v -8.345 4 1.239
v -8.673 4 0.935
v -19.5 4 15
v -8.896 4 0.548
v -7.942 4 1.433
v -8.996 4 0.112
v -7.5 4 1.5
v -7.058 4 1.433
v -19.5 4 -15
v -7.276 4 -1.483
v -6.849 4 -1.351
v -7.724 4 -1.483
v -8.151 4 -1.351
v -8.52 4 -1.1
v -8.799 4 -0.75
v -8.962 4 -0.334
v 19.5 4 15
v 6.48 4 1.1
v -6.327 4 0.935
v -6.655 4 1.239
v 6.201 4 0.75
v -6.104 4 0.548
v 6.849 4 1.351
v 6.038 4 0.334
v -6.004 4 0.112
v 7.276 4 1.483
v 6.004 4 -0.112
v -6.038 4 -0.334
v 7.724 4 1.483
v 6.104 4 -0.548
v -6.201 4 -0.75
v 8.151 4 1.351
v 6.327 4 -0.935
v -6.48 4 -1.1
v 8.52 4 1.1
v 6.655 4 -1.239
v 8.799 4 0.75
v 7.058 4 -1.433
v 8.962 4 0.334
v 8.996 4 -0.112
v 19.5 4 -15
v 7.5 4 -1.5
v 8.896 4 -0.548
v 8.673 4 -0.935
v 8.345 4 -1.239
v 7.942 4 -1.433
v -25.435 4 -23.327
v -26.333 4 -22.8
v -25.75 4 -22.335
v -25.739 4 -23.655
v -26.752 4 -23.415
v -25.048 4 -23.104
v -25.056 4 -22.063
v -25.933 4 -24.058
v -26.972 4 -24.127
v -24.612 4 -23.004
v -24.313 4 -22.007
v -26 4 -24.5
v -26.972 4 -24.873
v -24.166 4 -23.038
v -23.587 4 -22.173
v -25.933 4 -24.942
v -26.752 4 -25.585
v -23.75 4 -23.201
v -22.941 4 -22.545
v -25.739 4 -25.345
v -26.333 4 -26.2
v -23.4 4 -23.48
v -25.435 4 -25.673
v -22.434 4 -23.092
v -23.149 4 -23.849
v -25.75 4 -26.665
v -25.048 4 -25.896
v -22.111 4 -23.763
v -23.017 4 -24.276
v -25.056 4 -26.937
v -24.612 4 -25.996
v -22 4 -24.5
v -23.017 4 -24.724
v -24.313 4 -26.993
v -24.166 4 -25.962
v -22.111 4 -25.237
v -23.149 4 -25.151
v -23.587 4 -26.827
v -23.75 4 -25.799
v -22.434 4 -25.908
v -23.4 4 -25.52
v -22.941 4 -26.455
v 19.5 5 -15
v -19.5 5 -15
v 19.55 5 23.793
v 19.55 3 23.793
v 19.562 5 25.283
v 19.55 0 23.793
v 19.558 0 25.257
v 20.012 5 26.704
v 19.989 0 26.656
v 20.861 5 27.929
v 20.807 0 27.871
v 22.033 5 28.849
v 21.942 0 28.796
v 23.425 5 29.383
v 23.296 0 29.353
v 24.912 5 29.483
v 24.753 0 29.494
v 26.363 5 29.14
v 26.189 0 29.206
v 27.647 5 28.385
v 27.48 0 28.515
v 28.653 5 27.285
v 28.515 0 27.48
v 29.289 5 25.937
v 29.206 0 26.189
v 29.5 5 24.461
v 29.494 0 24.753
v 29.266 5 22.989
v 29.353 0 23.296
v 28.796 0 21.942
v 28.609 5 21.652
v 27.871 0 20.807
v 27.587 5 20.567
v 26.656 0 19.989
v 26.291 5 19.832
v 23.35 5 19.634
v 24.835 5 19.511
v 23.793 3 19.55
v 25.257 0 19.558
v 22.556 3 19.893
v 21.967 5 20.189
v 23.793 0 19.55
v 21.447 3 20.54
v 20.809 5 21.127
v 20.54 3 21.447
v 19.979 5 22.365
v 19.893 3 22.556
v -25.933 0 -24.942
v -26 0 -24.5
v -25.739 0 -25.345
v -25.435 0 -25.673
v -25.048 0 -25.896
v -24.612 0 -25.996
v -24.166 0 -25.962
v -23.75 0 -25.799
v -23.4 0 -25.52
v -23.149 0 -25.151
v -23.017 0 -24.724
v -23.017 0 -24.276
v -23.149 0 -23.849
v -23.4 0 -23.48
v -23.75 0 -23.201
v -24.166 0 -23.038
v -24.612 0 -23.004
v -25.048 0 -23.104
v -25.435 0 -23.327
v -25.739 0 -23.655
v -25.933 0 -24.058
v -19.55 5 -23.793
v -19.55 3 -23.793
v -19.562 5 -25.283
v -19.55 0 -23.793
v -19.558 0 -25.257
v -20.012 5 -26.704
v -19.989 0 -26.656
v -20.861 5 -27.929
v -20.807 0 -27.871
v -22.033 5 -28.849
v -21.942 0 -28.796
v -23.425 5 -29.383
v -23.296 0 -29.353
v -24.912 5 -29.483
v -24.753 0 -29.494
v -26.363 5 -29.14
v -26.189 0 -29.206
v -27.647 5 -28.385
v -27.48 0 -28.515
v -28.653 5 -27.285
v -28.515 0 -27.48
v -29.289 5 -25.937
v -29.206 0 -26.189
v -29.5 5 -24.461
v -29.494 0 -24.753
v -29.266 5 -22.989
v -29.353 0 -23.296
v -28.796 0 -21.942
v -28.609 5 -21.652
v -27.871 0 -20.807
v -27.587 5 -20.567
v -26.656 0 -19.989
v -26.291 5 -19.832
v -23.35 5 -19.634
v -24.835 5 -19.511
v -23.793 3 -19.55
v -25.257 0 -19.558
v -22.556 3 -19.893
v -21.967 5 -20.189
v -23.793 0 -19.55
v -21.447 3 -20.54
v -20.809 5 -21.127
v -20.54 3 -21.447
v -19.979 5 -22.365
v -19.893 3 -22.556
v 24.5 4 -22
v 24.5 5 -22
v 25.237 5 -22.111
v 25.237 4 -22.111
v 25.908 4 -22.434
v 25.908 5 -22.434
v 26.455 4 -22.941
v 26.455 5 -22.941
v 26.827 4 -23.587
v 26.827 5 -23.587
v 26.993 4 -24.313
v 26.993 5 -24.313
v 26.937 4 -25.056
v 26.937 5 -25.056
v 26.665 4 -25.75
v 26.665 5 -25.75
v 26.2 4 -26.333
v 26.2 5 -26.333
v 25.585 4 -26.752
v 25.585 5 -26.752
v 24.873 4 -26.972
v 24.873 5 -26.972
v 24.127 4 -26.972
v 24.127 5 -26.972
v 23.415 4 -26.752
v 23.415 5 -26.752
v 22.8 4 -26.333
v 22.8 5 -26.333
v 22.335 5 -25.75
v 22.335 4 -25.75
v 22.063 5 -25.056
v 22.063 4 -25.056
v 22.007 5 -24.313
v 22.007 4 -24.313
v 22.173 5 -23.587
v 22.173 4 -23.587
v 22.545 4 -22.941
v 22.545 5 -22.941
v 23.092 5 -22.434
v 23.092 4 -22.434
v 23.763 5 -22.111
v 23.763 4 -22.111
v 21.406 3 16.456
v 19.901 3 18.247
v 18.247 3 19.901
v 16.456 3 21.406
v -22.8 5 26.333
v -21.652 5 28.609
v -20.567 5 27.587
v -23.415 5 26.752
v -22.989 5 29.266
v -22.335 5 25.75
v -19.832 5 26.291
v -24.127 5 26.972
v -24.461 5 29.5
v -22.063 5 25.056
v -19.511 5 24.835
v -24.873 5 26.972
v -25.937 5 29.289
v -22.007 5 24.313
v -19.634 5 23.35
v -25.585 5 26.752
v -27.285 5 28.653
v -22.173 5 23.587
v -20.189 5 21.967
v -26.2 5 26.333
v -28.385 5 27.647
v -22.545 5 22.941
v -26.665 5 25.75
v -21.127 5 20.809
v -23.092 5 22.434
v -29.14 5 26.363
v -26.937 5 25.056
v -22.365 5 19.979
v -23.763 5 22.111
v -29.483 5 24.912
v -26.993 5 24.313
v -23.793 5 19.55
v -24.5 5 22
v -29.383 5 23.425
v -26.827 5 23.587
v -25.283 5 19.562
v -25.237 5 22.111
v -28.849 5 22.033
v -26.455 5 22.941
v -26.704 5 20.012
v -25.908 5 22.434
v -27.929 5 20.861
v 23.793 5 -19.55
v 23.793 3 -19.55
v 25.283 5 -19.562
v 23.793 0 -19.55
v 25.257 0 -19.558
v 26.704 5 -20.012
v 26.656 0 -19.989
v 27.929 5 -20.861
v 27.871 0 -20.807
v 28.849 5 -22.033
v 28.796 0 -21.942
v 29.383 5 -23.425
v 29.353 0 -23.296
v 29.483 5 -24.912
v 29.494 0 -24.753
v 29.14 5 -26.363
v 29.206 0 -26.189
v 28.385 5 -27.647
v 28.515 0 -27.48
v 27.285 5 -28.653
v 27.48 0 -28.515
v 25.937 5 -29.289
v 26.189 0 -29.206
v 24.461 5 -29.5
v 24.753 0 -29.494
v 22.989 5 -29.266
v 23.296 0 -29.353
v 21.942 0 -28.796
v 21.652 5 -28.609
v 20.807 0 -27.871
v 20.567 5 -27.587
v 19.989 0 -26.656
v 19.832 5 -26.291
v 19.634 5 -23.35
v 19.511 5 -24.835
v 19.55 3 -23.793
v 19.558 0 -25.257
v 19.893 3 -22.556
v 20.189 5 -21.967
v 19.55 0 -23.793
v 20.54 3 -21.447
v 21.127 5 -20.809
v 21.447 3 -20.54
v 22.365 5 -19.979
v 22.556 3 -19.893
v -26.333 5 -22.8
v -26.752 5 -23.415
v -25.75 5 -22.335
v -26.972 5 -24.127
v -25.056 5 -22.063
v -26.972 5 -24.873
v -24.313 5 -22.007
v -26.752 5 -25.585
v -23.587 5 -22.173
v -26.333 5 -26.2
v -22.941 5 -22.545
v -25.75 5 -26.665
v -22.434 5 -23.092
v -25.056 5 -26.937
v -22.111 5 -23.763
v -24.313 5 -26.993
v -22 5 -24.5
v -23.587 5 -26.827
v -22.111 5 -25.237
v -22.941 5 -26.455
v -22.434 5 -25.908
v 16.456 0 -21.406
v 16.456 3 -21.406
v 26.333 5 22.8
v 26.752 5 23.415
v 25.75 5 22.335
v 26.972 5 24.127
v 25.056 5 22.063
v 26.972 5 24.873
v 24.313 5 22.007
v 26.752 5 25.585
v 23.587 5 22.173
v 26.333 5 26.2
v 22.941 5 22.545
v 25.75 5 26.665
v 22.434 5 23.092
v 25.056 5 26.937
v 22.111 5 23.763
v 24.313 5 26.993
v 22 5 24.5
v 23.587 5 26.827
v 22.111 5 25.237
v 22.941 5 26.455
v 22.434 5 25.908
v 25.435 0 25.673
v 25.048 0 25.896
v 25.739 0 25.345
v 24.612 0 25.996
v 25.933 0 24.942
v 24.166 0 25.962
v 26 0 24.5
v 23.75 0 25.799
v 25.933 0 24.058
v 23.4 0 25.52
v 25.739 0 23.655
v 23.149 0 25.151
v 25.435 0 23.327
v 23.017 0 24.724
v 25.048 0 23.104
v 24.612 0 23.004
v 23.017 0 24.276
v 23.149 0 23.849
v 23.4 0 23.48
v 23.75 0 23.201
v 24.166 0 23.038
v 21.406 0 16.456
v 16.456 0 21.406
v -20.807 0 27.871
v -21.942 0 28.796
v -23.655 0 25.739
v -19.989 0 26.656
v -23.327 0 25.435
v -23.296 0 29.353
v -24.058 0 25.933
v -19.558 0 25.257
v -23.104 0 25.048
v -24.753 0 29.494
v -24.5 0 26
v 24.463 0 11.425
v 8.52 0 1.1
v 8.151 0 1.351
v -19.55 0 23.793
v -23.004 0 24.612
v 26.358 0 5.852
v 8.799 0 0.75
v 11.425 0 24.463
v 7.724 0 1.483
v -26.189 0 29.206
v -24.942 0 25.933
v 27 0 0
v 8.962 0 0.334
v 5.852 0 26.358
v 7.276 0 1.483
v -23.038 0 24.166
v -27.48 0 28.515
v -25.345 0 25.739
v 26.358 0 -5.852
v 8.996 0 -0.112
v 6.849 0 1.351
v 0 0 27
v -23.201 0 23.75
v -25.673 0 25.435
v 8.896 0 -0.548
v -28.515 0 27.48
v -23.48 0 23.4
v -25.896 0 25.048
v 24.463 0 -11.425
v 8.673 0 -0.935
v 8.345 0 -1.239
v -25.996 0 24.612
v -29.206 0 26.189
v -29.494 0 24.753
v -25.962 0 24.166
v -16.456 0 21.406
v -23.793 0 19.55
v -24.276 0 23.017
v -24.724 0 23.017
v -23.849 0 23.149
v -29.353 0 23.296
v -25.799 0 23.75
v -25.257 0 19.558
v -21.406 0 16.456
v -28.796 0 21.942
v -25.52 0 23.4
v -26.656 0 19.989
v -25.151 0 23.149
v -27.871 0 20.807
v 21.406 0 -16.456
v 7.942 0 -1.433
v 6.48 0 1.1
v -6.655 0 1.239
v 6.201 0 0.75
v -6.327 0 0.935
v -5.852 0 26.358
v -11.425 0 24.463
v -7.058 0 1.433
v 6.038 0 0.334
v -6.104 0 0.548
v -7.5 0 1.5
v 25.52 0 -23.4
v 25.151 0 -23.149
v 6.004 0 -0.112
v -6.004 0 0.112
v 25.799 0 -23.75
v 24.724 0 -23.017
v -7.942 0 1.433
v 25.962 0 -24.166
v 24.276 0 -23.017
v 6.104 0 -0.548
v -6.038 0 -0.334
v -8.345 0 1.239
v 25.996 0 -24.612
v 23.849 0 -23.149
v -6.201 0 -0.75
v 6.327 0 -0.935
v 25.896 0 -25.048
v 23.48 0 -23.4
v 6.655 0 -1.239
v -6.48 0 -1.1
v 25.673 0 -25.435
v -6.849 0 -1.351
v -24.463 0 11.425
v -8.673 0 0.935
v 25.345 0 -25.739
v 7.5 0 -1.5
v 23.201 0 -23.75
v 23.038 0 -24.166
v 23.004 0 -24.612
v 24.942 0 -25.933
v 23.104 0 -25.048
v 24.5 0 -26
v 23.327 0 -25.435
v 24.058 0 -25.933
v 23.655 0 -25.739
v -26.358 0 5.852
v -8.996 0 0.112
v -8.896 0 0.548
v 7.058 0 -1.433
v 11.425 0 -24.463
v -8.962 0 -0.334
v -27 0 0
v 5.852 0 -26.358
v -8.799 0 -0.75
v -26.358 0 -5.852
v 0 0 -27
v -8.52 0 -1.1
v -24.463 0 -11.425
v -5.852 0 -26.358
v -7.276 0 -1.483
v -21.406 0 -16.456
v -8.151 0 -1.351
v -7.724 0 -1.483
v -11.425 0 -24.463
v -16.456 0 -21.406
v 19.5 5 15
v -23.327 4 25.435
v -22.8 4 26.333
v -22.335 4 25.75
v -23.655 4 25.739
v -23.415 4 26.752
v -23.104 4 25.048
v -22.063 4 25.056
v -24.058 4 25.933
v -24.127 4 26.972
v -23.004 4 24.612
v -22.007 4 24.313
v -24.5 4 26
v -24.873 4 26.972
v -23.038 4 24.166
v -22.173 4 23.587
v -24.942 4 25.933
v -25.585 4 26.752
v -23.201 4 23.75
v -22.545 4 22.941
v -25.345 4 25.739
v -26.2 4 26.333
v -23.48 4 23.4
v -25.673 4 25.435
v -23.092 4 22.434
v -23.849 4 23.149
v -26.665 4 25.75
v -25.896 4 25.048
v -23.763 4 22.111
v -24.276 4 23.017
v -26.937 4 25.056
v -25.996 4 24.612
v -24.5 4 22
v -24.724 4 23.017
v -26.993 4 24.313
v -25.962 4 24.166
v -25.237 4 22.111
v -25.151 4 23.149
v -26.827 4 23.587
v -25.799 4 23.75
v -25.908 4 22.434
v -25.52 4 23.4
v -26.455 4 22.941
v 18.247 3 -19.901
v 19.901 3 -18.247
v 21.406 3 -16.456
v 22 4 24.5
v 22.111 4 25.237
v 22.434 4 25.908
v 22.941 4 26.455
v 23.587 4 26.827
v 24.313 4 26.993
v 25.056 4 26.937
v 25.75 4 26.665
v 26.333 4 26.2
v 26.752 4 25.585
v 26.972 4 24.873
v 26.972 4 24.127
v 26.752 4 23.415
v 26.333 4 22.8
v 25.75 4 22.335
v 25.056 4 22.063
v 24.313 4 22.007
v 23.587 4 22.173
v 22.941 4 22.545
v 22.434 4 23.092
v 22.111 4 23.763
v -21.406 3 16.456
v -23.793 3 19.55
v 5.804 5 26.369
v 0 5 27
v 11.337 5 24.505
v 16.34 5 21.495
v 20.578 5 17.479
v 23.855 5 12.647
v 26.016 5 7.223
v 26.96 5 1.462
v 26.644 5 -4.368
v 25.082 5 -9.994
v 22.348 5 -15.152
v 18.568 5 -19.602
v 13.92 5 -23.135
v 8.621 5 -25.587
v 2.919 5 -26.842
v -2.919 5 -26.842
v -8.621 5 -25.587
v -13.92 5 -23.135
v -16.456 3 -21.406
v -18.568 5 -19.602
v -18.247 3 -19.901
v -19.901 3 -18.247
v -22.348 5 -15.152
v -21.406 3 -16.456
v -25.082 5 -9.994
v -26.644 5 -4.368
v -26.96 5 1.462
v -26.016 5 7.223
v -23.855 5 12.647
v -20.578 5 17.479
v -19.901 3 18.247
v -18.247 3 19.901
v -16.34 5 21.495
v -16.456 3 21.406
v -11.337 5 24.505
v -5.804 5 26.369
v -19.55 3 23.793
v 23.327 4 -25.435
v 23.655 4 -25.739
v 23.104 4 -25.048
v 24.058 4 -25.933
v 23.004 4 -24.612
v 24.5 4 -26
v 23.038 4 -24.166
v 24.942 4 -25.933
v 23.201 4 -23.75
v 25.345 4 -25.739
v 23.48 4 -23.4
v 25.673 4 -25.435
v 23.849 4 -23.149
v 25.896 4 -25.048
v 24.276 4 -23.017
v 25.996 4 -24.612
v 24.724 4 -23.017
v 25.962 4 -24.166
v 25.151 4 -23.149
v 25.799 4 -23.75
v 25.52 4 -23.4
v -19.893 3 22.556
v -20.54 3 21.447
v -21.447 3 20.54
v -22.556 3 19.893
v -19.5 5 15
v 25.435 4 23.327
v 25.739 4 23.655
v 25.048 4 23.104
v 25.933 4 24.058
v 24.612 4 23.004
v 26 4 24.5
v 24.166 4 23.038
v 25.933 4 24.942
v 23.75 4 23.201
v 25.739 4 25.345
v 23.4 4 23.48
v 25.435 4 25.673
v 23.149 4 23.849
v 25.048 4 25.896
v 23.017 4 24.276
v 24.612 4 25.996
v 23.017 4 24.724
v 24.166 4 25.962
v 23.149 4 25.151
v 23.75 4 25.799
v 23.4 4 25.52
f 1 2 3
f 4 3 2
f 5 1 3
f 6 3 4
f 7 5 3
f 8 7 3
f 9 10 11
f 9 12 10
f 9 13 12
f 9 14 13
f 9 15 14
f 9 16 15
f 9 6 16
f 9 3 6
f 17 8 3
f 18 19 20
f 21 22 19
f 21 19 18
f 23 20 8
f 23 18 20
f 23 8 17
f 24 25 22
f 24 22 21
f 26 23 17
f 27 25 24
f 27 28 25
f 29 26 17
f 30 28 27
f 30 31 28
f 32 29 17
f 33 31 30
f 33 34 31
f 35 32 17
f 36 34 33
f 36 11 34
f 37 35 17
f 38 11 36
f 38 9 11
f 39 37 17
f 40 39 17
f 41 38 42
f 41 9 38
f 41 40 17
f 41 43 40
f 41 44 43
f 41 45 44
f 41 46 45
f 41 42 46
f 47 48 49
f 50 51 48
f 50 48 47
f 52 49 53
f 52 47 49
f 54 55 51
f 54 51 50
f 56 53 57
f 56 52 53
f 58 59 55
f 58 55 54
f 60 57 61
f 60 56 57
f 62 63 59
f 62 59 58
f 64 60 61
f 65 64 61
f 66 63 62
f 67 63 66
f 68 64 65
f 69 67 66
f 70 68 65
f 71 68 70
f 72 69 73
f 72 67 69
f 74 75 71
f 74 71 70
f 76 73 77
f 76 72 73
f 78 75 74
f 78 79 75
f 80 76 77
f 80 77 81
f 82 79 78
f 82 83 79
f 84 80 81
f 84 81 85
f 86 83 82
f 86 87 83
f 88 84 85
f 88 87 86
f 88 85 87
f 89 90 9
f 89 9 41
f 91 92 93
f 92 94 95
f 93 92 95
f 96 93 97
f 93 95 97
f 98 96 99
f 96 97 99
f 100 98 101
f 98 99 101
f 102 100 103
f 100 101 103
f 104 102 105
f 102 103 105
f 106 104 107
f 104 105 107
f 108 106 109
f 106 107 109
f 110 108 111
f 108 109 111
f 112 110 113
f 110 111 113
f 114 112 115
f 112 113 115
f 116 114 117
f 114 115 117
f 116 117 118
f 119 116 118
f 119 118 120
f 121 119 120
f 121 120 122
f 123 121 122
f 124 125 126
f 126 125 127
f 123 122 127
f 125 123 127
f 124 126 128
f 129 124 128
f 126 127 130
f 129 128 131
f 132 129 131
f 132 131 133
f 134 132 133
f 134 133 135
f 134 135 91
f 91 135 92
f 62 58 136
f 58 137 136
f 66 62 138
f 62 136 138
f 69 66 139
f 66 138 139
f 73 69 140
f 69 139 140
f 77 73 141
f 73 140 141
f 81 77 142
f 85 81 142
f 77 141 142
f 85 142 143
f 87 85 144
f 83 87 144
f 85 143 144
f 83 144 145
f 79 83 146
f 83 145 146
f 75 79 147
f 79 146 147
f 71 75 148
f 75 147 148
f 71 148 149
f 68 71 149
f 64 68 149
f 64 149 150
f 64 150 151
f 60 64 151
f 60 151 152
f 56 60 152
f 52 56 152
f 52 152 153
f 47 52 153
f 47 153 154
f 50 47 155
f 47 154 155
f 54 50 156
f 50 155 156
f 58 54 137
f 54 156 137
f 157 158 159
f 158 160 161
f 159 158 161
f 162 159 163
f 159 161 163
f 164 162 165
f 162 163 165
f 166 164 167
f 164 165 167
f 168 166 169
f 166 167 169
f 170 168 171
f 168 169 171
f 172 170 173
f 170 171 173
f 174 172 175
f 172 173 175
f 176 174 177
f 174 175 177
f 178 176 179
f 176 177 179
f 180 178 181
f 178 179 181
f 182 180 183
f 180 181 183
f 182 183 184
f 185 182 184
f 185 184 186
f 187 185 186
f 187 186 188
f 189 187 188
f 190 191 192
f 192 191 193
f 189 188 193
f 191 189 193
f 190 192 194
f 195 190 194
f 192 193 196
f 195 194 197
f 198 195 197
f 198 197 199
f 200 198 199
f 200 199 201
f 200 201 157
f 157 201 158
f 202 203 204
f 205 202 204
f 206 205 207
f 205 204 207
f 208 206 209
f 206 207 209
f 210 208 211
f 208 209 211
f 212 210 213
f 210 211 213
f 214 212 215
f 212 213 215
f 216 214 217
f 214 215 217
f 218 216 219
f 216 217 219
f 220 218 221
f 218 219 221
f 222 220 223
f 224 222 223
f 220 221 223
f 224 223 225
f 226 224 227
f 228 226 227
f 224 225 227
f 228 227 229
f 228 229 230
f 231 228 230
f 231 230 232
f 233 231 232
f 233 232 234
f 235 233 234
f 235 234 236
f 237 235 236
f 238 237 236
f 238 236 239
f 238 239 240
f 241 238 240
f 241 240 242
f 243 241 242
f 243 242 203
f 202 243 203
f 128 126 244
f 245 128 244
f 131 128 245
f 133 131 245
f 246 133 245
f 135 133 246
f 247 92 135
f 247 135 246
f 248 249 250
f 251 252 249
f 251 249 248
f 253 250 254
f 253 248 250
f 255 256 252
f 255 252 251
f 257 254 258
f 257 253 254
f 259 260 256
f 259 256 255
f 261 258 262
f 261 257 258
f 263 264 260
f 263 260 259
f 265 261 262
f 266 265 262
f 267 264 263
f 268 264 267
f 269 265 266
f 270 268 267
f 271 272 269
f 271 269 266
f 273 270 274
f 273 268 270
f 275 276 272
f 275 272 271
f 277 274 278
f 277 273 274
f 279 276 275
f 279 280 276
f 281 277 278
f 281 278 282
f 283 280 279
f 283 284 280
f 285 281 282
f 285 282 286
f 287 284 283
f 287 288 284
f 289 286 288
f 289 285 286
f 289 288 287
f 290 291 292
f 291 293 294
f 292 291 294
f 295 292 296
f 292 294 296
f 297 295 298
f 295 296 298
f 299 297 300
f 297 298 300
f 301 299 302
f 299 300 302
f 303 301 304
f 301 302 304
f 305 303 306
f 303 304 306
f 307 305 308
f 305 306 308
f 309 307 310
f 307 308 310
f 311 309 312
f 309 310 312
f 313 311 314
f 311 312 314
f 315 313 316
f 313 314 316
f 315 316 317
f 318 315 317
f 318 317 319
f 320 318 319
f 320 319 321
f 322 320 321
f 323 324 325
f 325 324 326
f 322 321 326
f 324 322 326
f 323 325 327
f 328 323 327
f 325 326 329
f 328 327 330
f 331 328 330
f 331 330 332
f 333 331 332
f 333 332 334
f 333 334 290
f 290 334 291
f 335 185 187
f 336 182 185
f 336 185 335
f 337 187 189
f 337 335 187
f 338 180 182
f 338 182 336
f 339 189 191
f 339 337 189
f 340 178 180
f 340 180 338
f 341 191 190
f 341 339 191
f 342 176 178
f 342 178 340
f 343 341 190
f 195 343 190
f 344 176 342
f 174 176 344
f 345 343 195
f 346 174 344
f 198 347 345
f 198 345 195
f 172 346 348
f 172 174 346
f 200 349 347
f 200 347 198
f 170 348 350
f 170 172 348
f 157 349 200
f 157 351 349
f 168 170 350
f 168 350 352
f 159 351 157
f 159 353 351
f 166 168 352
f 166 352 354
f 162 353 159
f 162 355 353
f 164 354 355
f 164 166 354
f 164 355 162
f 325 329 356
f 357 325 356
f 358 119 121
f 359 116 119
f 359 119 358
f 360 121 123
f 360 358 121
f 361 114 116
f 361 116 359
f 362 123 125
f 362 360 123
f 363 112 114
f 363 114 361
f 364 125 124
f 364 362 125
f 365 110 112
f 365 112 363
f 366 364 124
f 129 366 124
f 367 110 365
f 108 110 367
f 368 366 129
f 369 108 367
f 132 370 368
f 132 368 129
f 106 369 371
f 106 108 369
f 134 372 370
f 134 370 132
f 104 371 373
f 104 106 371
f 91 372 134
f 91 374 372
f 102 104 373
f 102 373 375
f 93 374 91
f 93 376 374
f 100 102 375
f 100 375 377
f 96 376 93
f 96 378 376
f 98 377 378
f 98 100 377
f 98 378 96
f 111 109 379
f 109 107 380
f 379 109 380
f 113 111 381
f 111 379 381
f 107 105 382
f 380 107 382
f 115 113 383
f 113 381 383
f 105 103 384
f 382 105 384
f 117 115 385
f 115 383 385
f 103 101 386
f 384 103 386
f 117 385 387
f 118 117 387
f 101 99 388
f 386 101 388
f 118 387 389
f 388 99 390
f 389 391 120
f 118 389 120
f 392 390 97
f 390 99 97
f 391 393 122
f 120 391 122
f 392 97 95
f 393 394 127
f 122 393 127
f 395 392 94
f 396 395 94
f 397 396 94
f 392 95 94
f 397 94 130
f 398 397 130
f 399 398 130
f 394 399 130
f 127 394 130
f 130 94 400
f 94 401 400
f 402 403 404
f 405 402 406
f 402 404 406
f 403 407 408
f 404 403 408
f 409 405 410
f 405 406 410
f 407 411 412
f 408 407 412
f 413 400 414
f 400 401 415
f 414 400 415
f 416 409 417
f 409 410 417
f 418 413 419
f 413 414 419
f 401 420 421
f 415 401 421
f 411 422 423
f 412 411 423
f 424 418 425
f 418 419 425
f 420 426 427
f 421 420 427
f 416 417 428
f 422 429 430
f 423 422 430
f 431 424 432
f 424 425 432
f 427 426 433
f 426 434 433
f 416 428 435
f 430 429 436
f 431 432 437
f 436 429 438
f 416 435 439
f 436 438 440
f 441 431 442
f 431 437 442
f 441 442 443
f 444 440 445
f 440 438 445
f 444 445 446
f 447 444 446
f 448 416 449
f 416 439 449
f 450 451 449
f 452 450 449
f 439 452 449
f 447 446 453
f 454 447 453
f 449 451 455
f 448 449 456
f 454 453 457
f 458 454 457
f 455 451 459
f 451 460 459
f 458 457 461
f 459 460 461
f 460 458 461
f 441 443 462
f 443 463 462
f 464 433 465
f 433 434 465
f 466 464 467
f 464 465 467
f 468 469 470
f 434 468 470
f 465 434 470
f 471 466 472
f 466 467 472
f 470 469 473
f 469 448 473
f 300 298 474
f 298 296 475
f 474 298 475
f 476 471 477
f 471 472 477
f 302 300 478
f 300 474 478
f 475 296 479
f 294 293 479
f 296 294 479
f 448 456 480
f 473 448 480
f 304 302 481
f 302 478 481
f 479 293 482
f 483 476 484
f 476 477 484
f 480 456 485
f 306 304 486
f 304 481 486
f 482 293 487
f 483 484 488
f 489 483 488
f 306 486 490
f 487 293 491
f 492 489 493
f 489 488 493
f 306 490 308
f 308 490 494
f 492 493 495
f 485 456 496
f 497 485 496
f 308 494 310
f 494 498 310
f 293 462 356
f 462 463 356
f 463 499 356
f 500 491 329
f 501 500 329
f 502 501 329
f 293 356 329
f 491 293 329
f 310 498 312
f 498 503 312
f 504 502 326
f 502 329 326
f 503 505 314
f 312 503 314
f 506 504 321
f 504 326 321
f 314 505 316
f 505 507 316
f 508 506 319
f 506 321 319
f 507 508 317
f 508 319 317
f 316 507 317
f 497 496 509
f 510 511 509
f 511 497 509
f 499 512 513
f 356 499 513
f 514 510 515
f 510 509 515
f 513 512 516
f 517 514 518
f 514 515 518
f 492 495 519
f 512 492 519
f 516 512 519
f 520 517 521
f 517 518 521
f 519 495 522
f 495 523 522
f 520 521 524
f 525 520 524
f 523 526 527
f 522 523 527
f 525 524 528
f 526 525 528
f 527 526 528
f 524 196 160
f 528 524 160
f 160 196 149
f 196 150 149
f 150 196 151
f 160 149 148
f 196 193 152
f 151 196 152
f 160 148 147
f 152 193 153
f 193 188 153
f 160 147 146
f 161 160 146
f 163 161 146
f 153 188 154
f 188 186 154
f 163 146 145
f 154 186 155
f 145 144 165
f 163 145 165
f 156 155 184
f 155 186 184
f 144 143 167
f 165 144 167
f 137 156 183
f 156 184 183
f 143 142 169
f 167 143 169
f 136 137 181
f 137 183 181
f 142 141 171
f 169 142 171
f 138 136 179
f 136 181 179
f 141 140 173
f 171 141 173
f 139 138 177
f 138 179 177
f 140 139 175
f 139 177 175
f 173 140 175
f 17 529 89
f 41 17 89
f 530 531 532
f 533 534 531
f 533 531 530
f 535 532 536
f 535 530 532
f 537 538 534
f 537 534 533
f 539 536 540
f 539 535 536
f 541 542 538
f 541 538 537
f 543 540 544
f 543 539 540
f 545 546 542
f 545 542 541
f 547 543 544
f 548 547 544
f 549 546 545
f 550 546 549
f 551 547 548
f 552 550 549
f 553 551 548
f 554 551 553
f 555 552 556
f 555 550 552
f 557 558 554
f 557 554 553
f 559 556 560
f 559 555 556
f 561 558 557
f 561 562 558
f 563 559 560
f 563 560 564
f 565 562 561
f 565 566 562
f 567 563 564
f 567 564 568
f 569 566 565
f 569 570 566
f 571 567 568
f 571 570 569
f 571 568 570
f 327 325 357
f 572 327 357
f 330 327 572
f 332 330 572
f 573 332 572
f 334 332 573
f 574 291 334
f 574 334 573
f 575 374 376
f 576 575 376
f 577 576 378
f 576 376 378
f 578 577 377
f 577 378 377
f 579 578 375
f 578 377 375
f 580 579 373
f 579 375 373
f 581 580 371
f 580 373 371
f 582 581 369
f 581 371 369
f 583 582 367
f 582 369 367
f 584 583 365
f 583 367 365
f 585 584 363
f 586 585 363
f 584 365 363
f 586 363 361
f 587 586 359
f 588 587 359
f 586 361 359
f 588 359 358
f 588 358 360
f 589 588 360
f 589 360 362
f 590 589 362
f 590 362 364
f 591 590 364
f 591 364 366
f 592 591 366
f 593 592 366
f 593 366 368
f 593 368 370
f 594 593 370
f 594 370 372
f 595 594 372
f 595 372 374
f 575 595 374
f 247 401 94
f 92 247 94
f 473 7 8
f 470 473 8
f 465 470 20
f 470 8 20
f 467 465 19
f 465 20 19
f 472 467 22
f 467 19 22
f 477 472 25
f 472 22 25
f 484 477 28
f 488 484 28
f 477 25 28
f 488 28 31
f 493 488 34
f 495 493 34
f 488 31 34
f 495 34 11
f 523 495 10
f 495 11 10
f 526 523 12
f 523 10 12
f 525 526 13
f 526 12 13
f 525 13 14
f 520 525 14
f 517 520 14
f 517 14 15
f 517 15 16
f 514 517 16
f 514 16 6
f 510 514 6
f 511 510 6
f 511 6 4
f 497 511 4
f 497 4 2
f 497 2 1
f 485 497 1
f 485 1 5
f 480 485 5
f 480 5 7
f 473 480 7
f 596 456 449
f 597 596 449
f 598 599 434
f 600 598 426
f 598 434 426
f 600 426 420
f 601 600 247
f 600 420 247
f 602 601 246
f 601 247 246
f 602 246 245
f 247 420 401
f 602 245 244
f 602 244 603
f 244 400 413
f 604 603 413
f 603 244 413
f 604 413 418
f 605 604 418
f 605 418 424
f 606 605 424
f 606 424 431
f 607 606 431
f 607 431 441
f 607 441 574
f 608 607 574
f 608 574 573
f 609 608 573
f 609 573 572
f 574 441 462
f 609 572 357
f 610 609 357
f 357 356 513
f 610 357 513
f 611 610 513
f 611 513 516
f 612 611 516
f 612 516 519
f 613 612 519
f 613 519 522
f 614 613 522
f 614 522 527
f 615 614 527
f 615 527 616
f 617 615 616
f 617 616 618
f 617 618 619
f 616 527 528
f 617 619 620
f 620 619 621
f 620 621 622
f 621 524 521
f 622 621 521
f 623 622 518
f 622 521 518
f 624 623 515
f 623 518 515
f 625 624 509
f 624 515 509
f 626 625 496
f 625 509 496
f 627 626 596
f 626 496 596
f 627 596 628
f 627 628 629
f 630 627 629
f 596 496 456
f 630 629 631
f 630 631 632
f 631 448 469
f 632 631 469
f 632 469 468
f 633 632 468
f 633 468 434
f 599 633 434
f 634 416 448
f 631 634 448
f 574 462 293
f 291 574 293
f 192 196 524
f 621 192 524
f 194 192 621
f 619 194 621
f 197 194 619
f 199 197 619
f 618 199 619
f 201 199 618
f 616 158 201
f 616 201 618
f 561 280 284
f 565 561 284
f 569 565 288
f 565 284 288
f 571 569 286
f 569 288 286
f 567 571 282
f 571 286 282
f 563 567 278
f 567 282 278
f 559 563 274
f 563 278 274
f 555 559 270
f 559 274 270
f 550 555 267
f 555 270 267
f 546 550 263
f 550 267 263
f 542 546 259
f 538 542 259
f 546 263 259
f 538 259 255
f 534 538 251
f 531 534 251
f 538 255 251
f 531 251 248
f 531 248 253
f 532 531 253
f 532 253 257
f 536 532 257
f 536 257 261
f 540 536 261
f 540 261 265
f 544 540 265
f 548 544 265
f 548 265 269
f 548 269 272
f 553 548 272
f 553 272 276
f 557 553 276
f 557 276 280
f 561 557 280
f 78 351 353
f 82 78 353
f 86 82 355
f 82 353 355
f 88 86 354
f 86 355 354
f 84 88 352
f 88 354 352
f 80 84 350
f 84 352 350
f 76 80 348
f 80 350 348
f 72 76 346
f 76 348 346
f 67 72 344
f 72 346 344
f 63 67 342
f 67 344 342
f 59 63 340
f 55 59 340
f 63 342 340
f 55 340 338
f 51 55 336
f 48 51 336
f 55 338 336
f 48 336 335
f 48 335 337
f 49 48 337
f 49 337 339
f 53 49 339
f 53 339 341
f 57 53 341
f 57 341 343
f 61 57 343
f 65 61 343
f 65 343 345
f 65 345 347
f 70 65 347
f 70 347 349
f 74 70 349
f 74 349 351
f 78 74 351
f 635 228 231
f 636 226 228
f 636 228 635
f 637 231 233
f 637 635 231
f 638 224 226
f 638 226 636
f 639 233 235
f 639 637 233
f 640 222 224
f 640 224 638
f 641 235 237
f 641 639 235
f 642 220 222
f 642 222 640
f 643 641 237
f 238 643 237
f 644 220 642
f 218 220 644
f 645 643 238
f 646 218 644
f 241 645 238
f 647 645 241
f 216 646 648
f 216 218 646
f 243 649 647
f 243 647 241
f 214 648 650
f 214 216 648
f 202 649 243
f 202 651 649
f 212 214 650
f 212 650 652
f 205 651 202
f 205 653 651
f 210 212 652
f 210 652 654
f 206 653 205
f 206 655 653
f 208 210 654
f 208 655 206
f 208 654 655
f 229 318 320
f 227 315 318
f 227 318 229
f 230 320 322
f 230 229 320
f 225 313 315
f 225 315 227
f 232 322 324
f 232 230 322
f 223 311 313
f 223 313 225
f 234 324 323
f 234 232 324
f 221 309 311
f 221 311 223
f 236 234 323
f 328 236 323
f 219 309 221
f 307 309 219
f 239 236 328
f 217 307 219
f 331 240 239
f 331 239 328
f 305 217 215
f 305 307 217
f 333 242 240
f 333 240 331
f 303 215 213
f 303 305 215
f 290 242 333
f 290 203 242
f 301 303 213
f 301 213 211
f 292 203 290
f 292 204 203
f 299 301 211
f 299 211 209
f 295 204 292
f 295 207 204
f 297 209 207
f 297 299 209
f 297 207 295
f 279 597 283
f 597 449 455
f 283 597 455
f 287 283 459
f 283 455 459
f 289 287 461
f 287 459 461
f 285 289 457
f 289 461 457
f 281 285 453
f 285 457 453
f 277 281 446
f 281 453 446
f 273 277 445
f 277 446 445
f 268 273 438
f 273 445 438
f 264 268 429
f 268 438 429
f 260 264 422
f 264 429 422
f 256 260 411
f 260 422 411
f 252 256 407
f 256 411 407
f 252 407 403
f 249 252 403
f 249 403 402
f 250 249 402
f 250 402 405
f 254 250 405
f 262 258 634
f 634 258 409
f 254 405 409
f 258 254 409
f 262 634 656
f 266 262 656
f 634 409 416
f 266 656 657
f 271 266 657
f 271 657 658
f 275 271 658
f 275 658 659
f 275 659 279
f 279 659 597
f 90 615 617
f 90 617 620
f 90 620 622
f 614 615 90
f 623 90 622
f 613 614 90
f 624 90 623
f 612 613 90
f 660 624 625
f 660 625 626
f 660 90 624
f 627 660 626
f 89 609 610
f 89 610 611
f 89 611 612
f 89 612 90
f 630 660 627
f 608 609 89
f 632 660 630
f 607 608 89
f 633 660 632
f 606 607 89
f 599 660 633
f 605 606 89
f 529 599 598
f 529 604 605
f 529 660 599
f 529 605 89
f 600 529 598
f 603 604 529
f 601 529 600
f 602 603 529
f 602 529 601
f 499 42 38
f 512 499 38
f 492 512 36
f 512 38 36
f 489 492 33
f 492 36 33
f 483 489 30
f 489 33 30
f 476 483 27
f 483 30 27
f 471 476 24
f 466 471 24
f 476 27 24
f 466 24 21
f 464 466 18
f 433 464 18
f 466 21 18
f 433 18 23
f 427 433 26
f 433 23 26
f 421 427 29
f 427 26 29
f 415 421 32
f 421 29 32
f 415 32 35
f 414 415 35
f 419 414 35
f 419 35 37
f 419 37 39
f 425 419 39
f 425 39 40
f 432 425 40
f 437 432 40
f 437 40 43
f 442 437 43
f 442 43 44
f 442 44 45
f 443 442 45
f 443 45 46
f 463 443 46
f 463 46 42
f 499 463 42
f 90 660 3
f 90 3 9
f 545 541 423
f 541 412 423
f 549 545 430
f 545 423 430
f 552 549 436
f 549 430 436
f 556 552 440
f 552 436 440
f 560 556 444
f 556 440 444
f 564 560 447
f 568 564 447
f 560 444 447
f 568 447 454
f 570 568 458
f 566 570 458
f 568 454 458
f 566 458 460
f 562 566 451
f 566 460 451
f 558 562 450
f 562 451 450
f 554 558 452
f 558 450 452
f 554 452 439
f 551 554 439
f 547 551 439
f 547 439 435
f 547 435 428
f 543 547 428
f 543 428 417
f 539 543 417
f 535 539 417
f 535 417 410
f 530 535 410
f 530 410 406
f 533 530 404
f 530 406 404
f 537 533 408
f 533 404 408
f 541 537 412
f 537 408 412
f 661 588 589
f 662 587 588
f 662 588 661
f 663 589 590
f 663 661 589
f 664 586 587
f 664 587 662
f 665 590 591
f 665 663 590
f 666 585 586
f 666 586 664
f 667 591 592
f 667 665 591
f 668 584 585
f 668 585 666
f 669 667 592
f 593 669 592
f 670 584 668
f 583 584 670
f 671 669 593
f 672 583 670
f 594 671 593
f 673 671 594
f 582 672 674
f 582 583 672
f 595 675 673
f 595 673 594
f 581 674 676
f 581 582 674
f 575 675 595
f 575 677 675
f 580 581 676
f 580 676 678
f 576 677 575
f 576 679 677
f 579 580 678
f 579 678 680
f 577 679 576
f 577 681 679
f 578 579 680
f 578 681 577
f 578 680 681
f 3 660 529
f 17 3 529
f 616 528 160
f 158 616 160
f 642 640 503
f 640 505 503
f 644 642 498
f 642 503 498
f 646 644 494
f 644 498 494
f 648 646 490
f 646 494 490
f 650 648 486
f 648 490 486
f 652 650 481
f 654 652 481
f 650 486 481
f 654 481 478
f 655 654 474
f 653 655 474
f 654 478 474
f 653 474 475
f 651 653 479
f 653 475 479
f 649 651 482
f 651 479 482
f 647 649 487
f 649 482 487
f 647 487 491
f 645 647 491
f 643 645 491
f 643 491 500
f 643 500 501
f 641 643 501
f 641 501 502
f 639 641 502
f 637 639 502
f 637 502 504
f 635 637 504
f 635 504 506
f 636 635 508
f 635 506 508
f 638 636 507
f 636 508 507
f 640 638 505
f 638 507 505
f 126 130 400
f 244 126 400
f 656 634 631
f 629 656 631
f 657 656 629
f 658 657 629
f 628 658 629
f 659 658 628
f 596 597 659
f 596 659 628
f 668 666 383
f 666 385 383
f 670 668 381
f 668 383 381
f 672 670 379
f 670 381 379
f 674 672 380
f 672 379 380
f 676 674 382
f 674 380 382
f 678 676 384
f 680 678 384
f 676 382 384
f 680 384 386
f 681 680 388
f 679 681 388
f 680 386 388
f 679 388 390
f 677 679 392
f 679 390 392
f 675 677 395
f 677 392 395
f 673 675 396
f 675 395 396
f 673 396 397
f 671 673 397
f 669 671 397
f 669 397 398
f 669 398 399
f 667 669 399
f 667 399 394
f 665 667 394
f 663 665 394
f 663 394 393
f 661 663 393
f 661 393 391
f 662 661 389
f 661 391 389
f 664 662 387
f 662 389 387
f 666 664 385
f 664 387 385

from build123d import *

# Parameters (mm, degrees)
SKETCH1_R                               = 27
BOSS_EXTRUDE1_DEPTH                     = 5
BOSS_EXTRUDE3_DEPTH                     = 3
SKETCH2_3_R                             = 5
BOSS_EXTRUDE4_DEPTH                     = 5
CBORE_FOR_M5_HEX_HEAD_BOLT1_D           = 3
CBORE_FOR_M5_HEX_HEAD_BOLT1_CBORE_D     = 5
CBORE_FOR_M5_HEX_HEAD_BOLT1_CBORE_DEPTH = 1
SKETCH5_W                               = 39
SKETCH5_H                               = 30
CUT_EXTRUDE1_DEPTH                      = 1
SKETCH6_R                               = 1.5
CUT_EXTRUDE2_DEPTH                      = 42.910619179
CIRPATTERN1_COUNT                       = 4


with BuildPart() as part:
    # Sketch1 → Boss-Extrude1 (new body)
    with BuildSketch(Plane(origin=(0, 0, 0), x_dir=(1, 0, 0), z_dir=(0, 1, 0))):
        with Locations(Location((0, 0, 0), (0, 0, 270))):
            Circle(SKETCH1_R)
    extrude(amount=BOSS_EXTRUDE1_DEPTH)

    # Sketch2 → Boss-Extrude3 (add)
    with BuildSketch(Plane(origin=(0, 0, 0), x_dir=(1, 0, 0), z_dir=(0, 1, 0))):
        with BuildLine():
            ThreePointArc((-19.550252532, 23.792893219), (-20.964466094, 20.964466094), (-23.792893219, 19.550252532))
            Line((-23.792893219, 19.550252532), (-21.405668752, 16.455921283))
            ThreePointArc((-21.405668752, 16.455921283), (-19.091883092, 19.091883092), (-16.455921283, 21.405668752))
            Line((-16.455921283, 21.405668752), (-19.550252532, 23.792893219))
        make_face()
    boss_extrude3 = extrude(amount=BOSS_EXTRUDE3_DEPTH)

    # Sketch2<3> → Boss-Extrude4 (add, through all)
    with BuildSketch(Plane(origin=(0, 0, 0), x_dir=(1, 0, 0), z_dir=(0, 1, 0))):
        with Locations(Location((-24.5, 24.5, 0), (0, 0, 351.869897646))):
            Circle(SKETCH2_3_R)
    boss_extrude4 = extrude(amount=BOSS_EXTRUDE4_DEPTH)

    # CBORE for M5 Hex Head Bolt1 (through all)
    with Locations(Plane(origin=(0, 5, 0), x_dir=(1, 0, 0), z_dir=(0, 1, 0))):
        with Locations((-24.5, 24.5)):
            cbore_for_m5_hex_head_bolt1 = CounterBoreHole(CBORE_FOR_M5_HEX_HEAD_BOLT1_D / 2, CBORE_FOR_M5_HEX_HEAD_BOLT1_CBORE_D / 2, CBORE_FOR_M5_HEX_HEAD_BOLT1_CBORE_DEPTH)

    # Sketch5 → Cut-Extrude1 (cut)
    with BuildSketch(Plane(origin=(0, 5, 0), x_dir=(1, 0, 0), z_dir=(0, 1, 0))):
        Rectangle(SKETCH5_W, SKETCH5_H)
    extrude(amount=-CUT_EXTRUDE1_DEPTH, mode=Mode.SUBTRACT)

    # Sketch6 → Cut-Extrude2 (cut, through all)
    with BuildSketch(Plane(origin=(0, 4, 0), x_dir=(1, 0, 0), z_dir=(0, 1, 0))):
        with Locations(Location((-7.5, 0, 0), (0, 0, 270))):
            Circle(SKETCH6_R)
        with Locations(Location((7.5, 0, 0), (0, 0, 90))):
            Circle(SKETCH6_R)
    extrude(amount=-CUT_EXTRUDE2_DEPTH, mode=Mode.SUBTRACT)

    # CirPattern1: Boss-Extrude3, Boss-Extrude4, CBORE for M5 Hex Head Bolt1 ×4 about axis
    cirpattern1_axis = Axis((0, 0, 0), (0, 1, 0))
    add([boss_extrude3.rotate(cirpattern1_axis, i * 360 / CIRPATTERN1_COUNT) for i in range(1, CIRPATTERN1_COUNT)])
    add([boss_extrude4.rotate(cirpattern1_axis, i * 360 / CIRPATTERN1_COUNT) for i in range(1, CIRPATTERN1_COUNT)])
    add([cbore_for_m5_hex_head_bolt1.rotate(cirpattern1_axis, i * 360 / CIRPATTERN1_COUNT) for i in range(1, CIRPATTERN1_COUNT)], mode=Mode.SUBTRACT)


solid = part.part
